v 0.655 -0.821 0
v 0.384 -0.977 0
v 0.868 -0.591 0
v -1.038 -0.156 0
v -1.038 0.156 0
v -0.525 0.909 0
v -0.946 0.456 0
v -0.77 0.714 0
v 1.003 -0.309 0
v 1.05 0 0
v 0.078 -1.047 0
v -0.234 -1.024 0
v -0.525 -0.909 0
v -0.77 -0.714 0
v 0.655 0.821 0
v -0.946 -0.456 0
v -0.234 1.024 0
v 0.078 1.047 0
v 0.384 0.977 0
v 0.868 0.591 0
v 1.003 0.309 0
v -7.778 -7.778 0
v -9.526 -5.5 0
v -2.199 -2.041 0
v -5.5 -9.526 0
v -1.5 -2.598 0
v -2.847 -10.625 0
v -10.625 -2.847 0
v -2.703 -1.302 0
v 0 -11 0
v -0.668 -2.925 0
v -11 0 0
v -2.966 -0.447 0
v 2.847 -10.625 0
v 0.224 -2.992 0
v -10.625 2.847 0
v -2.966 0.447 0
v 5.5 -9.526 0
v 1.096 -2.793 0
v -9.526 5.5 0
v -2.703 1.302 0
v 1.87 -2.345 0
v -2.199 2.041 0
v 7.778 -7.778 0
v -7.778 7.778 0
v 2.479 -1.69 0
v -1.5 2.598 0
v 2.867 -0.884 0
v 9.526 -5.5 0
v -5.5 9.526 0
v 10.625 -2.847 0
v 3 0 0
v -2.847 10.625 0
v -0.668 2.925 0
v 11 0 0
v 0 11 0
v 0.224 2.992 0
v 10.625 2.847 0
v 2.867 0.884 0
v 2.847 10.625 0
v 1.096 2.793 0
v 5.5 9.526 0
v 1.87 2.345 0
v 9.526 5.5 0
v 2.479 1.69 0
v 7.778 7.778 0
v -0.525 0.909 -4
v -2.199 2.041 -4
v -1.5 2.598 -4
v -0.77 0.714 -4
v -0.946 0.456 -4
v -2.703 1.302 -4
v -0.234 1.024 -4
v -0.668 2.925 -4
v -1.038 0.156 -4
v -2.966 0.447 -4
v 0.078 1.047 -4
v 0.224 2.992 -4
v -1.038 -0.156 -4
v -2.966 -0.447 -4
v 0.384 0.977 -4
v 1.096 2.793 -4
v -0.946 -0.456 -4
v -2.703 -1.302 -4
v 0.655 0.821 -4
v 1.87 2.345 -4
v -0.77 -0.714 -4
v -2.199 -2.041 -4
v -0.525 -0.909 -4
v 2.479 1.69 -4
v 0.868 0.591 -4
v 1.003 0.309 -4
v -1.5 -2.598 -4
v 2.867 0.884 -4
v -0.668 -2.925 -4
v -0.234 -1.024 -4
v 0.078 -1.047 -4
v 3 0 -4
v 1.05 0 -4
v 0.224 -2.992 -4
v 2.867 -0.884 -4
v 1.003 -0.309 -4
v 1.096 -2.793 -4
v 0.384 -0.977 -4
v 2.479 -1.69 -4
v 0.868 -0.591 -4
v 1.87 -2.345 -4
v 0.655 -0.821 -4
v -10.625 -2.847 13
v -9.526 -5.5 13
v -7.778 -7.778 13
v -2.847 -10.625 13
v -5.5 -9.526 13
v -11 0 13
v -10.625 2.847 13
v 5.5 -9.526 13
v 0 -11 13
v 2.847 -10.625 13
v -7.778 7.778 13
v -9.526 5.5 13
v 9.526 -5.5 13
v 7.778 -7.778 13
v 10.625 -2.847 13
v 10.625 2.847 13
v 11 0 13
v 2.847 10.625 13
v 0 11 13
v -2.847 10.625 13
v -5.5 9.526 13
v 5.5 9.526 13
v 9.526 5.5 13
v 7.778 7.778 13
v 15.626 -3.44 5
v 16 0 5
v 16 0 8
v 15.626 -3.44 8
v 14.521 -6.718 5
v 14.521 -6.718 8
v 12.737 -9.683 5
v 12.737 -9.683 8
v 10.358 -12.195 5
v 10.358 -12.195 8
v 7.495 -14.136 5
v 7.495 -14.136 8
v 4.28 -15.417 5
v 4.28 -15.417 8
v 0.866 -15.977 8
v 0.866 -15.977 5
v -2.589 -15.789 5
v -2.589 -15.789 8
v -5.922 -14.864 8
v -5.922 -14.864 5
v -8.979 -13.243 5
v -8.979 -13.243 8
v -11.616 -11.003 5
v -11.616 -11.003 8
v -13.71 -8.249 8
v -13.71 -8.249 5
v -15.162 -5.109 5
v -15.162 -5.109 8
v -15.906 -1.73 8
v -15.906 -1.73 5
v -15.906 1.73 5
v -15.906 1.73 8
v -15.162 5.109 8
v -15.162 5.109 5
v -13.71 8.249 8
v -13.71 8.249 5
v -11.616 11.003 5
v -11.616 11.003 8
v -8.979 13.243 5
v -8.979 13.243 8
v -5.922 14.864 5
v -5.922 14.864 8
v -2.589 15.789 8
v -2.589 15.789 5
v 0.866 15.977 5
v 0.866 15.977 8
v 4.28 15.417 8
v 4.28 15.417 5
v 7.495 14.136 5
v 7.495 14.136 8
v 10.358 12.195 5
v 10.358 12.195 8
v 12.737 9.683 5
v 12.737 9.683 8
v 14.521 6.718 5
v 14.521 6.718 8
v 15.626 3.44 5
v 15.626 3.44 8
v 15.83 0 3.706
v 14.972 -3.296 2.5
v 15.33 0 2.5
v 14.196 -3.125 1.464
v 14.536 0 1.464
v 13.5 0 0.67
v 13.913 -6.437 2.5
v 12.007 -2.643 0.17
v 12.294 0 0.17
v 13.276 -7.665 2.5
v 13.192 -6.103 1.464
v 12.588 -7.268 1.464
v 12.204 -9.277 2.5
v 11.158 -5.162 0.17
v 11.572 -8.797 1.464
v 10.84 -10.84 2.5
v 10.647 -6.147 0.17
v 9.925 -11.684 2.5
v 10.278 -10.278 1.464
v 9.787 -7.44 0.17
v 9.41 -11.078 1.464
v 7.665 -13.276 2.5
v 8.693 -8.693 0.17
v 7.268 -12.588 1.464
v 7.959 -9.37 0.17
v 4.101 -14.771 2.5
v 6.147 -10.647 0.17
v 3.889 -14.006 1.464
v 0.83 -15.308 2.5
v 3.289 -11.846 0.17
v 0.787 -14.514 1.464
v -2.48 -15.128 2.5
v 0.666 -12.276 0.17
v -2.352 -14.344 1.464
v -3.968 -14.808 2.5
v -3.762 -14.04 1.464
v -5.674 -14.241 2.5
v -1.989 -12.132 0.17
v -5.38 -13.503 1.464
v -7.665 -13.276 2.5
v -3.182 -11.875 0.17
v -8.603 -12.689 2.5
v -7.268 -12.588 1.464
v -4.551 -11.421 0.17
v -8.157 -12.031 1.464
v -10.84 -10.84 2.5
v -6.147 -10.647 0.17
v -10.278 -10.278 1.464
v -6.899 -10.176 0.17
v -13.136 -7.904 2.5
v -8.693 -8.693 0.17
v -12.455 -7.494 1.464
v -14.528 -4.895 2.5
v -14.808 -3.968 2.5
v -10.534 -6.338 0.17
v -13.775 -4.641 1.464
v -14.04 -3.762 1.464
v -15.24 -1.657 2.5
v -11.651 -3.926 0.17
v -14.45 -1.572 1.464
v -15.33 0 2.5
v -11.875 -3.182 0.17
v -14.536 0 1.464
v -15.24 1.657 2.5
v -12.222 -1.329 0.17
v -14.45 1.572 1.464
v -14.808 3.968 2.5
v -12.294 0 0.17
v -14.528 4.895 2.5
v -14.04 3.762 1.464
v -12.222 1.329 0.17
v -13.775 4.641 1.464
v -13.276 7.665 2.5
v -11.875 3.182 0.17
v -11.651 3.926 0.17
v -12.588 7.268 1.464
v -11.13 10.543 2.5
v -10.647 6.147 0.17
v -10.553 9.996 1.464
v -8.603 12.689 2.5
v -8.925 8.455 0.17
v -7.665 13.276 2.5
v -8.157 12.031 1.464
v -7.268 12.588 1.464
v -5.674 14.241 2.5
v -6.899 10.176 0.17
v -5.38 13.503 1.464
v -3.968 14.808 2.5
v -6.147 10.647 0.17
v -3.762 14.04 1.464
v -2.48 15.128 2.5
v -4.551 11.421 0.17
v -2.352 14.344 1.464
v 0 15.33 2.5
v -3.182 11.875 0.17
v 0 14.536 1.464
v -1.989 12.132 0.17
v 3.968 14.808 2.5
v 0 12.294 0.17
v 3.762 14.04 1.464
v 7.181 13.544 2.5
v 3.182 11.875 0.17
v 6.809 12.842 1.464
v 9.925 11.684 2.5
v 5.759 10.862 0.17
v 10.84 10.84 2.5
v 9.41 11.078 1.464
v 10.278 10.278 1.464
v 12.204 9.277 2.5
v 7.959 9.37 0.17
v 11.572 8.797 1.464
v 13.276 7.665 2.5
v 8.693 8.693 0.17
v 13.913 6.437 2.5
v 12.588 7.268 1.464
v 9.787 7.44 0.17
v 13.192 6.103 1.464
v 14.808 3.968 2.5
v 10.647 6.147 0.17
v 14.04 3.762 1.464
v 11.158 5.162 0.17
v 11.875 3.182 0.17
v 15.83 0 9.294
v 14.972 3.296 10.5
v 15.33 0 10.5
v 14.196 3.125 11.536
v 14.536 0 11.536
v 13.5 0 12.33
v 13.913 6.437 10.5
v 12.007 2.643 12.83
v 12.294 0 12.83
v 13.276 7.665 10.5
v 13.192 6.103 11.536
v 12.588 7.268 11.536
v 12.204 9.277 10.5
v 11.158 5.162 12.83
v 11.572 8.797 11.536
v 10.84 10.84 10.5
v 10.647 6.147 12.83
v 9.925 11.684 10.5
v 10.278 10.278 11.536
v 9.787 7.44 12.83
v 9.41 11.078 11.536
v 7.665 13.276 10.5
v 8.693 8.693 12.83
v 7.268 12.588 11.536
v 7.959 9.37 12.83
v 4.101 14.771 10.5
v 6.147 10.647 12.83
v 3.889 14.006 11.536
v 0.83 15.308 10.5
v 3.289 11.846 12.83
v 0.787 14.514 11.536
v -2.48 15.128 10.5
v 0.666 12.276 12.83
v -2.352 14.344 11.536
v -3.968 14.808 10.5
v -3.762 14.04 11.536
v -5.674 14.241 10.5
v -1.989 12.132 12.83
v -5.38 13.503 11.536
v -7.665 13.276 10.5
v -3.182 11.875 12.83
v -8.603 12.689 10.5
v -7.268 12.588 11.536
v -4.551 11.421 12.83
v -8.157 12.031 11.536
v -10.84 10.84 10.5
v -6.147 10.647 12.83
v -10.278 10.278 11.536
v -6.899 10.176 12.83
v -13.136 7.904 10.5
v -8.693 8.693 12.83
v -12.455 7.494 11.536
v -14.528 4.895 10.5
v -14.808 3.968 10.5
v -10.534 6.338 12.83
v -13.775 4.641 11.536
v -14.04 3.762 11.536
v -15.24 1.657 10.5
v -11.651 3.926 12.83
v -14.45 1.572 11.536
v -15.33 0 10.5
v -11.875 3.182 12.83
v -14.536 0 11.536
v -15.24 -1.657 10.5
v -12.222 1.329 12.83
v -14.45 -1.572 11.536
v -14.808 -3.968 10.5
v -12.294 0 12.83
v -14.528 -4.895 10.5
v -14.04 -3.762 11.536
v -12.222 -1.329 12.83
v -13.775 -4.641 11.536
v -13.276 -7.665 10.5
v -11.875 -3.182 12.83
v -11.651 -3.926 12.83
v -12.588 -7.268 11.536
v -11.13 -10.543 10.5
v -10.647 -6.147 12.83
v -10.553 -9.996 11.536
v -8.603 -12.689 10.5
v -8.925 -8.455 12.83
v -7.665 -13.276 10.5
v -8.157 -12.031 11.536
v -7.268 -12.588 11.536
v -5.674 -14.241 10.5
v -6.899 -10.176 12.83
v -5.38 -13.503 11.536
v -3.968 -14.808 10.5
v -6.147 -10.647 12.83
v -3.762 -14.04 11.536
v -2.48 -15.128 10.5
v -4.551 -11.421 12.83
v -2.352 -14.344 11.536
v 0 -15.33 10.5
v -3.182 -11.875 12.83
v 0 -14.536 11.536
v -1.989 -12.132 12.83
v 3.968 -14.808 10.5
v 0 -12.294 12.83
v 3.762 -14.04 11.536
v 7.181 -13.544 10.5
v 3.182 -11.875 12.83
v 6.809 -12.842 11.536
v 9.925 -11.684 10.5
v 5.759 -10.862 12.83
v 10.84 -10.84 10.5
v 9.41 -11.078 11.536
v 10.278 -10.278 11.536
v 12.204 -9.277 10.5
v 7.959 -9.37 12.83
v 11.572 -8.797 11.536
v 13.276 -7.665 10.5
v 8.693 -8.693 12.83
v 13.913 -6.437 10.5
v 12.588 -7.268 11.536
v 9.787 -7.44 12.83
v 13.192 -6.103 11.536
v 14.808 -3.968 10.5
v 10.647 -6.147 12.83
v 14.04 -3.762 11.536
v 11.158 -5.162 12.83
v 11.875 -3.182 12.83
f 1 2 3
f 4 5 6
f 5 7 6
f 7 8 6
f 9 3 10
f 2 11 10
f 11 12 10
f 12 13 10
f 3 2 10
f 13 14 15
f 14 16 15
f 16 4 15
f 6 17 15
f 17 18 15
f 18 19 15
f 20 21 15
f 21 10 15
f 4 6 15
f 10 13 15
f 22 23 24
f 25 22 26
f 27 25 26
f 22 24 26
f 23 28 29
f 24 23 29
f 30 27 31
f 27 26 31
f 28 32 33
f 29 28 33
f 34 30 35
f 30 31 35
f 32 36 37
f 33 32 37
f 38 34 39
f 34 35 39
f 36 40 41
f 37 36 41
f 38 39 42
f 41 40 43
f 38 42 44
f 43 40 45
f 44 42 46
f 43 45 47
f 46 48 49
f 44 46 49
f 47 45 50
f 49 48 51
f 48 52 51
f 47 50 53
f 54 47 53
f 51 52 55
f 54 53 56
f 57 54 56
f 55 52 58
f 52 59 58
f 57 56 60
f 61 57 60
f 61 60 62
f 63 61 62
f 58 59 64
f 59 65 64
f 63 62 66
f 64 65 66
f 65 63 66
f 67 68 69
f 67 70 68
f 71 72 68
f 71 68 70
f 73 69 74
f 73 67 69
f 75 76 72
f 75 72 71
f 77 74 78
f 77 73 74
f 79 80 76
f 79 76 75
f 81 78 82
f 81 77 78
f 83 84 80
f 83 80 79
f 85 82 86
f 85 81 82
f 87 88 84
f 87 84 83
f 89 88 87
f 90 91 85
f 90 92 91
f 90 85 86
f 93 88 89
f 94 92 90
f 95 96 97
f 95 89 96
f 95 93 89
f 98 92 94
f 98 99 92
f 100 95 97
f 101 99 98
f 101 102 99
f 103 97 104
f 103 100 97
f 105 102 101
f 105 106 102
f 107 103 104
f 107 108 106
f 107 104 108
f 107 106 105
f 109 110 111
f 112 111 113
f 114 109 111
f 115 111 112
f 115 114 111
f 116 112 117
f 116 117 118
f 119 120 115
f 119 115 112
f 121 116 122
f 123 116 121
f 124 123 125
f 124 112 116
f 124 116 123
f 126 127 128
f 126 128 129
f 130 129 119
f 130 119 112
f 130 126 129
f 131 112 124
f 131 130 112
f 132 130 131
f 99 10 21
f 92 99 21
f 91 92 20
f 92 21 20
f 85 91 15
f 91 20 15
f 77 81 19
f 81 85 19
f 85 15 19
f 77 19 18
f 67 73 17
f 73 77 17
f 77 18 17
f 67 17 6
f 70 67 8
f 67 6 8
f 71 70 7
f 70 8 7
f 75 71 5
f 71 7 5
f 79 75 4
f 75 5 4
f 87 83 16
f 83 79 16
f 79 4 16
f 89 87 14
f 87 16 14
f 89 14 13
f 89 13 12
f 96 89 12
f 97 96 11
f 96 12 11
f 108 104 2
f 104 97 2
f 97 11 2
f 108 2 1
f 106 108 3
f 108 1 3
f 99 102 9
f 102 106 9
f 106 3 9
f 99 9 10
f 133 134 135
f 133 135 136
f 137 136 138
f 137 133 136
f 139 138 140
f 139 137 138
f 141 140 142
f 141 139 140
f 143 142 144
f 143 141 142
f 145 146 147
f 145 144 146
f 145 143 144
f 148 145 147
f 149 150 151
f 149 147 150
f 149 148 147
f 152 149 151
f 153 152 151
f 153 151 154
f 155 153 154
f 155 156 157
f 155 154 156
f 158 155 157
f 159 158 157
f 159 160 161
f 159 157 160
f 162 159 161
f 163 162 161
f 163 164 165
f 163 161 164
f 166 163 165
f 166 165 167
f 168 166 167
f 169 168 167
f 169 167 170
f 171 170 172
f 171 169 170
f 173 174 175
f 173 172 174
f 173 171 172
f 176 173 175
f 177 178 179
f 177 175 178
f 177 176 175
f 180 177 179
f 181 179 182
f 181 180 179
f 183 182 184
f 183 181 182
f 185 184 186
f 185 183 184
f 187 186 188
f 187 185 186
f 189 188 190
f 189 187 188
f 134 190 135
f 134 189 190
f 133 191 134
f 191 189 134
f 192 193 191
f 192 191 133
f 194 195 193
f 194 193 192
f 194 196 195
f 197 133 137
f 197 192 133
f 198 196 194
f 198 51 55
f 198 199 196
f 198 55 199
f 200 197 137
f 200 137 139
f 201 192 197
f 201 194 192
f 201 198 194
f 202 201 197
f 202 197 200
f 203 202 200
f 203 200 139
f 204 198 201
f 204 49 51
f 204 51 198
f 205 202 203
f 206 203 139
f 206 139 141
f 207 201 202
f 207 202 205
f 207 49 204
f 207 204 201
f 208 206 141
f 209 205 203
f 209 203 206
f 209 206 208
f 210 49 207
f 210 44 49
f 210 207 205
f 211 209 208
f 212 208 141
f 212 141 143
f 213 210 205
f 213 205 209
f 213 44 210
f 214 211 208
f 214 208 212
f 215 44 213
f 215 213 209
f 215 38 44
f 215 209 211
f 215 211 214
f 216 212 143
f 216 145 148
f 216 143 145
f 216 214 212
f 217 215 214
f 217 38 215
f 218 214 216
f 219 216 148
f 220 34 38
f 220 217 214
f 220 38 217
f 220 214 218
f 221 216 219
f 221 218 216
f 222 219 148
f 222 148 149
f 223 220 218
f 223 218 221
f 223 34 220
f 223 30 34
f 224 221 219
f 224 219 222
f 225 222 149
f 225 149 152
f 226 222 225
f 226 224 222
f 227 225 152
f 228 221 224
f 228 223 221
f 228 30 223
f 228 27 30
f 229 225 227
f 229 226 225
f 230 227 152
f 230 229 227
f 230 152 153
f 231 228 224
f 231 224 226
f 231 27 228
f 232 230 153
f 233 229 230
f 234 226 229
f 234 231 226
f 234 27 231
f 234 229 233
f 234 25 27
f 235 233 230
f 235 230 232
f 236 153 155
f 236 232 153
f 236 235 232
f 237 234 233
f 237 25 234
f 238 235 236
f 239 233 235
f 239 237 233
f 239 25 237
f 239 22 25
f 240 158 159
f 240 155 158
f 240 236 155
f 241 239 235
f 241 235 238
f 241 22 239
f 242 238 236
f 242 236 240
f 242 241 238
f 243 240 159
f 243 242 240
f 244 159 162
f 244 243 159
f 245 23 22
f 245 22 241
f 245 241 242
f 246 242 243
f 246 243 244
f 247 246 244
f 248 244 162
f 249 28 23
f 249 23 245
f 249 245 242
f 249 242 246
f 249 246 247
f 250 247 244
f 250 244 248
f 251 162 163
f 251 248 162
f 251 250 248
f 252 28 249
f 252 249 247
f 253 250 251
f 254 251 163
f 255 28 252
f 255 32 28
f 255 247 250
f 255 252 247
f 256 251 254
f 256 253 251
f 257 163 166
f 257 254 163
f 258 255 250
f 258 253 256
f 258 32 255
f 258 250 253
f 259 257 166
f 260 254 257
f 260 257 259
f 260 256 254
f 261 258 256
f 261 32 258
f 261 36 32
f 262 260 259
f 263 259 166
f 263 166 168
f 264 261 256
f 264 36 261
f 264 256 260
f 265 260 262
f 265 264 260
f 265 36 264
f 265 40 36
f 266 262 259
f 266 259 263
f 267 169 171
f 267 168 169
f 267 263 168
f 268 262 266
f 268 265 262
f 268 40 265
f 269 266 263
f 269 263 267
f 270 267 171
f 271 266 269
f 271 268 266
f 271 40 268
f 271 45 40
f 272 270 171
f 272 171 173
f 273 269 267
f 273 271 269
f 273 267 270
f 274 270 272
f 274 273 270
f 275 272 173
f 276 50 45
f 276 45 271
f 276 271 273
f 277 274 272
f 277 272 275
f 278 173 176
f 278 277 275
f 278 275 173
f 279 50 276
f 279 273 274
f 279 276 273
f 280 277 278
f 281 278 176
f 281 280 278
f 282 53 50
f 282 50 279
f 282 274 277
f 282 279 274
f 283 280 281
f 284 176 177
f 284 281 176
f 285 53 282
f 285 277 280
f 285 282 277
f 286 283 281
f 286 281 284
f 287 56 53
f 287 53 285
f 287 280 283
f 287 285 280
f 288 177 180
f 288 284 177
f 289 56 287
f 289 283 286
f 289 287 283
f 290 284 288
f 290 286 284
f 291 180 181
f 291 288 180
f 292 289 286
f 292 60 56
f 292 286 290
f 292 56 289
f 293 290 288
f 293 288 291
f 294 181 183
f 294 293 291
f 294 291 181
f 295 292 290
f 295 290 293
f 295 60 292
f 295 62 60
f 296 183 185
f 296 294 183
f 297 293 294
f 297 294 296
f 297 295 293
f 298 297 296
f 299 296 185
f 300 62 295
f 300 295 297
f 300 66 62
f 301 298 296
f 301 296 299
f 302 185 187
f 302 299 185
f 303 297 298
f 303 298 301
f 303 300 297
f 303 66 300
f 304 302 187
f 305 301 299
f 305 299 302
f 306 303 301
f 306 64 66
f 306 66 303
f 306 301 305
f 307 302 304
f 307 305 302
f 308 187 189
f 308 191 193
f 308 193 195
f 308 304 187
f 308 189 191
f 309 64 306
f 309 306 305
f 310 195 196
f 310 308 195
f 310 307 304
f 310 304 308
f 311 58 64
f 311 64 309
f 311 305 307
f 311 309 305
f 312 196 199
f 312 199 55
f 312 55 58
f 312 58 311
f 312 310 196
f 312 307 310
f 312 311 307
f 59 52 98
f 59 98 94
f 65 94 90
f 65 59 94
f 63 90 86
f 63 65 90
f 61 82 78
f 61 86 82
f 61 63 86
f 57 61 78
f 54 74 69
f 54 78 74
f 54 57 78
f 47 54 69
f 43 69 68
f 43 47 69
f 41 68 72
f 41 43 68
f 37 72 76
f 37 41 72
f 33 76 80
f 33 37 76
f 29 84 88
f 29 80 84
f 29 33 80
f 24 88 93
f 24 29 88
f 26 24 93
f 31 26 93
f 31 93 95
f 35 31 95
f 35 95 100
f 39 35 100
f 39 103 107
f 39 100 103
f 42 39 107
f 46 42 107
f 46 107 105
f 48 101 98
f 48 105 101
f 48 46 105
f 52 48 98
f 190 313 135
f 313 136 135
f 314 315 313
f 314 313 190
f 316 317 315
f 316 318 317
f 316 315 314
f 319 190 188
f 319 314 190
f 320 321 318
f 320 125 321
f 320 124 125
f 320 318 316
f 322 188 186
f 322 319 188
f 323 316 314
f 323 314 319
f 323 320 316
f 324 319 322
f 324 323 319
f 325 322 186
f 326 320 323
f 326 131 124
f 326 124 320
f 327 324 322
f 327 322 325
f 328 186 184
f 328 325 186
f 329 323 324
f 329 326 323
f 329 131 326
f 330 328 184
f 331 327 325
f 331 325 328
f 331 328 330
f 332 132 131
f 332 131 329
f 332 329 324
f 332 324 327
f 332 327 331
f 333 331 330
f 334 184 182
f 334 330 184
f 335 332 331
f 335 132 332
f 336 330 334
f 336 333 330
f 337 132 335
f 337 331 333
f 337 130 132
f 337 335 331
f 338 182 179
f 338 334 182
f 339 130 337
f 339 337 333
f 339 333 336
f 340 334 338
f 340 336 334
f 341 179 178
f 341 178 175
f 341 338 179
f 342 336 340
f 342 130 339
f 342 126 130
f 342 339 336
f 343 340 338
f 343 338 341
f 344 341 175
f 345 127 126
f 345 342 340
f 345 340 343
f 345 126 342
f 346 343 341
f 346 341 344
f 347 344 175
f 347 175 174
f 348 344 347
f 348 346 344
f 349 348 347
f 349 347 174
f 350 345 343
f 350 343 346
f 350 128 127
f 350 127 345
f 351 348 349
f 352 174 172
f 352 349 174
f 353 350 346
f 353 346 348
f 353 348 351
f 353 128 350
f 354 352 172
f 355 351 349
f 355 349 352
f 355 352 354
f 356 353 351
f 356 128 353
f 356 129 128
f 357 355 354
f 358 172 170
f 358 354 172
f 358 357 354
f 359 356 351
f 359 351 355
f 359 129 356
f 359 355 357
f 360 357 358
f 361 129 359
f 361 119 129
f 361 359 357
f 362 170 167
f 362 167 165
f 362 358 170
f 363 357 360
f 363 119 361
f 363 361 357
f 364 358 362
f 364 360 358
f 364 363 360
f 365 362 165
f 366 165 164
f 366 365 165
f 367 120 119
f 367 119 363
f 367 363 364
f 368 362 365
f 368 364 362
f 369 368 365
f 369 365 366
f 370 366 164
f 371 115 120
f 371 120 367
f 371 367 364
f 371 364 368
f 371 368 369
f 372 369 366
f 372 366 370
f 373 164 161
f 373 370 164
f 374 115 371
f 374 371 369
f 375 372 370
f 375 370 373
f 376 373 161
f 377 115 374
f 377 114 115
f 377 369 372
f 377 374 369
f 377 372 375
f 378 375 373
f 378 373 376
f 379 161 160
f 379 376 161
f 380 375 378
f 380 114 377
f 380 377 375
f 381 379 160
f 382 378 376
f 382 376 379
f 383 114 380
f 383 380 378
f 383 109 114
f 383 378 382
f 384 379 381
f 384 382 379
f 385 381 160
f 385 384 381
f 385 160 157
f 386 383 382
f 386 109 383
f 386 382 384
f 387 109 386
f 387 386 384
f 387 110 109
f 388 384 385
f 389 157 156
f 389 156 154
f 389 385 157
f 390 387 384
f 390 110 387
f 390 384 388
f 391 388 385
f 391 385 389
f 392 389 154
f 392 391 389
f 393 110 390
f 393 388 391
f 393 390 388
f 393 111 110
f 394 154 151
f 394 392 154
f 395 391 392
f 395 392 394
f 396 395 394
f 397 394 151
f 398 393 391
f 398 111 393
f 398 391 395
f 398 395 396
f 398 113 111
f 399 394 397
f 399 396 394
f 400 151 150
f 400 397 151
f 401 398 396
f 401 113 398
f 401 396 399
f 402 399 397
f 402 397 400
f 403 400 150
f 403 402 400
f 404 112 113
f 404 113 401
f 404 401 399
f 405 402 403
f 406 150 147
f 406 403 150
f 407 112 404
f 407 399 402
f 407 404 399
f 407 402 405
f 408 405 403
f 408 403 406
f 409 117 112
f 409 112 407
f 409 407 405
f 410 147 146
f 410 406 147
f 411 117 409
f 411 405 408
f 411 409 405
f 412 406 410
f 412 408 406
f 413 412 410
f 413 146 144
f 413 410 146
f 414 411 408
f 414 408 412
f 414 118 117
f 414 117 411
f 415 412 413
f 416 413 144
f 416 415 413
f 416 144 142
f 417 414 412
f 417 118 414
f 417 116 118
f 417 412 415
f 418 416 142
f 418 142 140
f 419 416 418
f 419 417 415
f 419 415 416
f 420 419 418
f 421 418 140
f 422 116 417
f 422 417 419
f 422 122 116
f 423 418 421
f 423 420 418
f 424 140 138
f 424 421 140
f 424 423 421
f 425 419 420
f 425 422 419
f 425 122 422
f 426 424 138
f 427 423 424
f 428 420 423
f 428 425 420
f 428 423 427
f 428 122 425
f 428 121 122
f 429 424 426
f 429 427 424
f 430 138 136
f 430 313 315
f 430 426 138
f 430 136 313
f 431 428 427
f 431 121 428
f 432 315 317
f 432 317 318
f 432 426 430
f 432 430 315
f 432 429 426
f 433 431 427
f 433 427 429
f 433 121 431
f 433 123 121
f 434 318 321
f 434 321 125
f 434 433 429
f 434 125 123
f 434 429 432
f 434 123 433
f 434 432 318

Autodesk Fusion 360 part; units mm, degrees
sketch "スケッチ1" plane through (0, 0, 0) normal (0, 0, 1) x (1, 0, 0)
  circle A0 centre (0, 0) radius 16
  dimension "d1" = 32
extrude "押し出し1" add sketch "スケッチ1" along normal blind 13
fillet "フィレット1" radius 5 2 edges at (-14.9172, -5.7858, 0) (-14.9172, -5.7858, 13)
sketch "スケッチ2" plane through (0, 0, 0) normal (0, 0, -1) x (1, 0, 0)
  circle A0 centre (0, 0) radius 11
  circle A1 centre (0, 0) radius 3
  circle A2 centre (0, 0) radius 1.05
  dimension "d6" = 6
  dimension "d7" = 2.1
extrude "押し出し2" add sketch "スケッチ2" along normal blind 4 contours A1
